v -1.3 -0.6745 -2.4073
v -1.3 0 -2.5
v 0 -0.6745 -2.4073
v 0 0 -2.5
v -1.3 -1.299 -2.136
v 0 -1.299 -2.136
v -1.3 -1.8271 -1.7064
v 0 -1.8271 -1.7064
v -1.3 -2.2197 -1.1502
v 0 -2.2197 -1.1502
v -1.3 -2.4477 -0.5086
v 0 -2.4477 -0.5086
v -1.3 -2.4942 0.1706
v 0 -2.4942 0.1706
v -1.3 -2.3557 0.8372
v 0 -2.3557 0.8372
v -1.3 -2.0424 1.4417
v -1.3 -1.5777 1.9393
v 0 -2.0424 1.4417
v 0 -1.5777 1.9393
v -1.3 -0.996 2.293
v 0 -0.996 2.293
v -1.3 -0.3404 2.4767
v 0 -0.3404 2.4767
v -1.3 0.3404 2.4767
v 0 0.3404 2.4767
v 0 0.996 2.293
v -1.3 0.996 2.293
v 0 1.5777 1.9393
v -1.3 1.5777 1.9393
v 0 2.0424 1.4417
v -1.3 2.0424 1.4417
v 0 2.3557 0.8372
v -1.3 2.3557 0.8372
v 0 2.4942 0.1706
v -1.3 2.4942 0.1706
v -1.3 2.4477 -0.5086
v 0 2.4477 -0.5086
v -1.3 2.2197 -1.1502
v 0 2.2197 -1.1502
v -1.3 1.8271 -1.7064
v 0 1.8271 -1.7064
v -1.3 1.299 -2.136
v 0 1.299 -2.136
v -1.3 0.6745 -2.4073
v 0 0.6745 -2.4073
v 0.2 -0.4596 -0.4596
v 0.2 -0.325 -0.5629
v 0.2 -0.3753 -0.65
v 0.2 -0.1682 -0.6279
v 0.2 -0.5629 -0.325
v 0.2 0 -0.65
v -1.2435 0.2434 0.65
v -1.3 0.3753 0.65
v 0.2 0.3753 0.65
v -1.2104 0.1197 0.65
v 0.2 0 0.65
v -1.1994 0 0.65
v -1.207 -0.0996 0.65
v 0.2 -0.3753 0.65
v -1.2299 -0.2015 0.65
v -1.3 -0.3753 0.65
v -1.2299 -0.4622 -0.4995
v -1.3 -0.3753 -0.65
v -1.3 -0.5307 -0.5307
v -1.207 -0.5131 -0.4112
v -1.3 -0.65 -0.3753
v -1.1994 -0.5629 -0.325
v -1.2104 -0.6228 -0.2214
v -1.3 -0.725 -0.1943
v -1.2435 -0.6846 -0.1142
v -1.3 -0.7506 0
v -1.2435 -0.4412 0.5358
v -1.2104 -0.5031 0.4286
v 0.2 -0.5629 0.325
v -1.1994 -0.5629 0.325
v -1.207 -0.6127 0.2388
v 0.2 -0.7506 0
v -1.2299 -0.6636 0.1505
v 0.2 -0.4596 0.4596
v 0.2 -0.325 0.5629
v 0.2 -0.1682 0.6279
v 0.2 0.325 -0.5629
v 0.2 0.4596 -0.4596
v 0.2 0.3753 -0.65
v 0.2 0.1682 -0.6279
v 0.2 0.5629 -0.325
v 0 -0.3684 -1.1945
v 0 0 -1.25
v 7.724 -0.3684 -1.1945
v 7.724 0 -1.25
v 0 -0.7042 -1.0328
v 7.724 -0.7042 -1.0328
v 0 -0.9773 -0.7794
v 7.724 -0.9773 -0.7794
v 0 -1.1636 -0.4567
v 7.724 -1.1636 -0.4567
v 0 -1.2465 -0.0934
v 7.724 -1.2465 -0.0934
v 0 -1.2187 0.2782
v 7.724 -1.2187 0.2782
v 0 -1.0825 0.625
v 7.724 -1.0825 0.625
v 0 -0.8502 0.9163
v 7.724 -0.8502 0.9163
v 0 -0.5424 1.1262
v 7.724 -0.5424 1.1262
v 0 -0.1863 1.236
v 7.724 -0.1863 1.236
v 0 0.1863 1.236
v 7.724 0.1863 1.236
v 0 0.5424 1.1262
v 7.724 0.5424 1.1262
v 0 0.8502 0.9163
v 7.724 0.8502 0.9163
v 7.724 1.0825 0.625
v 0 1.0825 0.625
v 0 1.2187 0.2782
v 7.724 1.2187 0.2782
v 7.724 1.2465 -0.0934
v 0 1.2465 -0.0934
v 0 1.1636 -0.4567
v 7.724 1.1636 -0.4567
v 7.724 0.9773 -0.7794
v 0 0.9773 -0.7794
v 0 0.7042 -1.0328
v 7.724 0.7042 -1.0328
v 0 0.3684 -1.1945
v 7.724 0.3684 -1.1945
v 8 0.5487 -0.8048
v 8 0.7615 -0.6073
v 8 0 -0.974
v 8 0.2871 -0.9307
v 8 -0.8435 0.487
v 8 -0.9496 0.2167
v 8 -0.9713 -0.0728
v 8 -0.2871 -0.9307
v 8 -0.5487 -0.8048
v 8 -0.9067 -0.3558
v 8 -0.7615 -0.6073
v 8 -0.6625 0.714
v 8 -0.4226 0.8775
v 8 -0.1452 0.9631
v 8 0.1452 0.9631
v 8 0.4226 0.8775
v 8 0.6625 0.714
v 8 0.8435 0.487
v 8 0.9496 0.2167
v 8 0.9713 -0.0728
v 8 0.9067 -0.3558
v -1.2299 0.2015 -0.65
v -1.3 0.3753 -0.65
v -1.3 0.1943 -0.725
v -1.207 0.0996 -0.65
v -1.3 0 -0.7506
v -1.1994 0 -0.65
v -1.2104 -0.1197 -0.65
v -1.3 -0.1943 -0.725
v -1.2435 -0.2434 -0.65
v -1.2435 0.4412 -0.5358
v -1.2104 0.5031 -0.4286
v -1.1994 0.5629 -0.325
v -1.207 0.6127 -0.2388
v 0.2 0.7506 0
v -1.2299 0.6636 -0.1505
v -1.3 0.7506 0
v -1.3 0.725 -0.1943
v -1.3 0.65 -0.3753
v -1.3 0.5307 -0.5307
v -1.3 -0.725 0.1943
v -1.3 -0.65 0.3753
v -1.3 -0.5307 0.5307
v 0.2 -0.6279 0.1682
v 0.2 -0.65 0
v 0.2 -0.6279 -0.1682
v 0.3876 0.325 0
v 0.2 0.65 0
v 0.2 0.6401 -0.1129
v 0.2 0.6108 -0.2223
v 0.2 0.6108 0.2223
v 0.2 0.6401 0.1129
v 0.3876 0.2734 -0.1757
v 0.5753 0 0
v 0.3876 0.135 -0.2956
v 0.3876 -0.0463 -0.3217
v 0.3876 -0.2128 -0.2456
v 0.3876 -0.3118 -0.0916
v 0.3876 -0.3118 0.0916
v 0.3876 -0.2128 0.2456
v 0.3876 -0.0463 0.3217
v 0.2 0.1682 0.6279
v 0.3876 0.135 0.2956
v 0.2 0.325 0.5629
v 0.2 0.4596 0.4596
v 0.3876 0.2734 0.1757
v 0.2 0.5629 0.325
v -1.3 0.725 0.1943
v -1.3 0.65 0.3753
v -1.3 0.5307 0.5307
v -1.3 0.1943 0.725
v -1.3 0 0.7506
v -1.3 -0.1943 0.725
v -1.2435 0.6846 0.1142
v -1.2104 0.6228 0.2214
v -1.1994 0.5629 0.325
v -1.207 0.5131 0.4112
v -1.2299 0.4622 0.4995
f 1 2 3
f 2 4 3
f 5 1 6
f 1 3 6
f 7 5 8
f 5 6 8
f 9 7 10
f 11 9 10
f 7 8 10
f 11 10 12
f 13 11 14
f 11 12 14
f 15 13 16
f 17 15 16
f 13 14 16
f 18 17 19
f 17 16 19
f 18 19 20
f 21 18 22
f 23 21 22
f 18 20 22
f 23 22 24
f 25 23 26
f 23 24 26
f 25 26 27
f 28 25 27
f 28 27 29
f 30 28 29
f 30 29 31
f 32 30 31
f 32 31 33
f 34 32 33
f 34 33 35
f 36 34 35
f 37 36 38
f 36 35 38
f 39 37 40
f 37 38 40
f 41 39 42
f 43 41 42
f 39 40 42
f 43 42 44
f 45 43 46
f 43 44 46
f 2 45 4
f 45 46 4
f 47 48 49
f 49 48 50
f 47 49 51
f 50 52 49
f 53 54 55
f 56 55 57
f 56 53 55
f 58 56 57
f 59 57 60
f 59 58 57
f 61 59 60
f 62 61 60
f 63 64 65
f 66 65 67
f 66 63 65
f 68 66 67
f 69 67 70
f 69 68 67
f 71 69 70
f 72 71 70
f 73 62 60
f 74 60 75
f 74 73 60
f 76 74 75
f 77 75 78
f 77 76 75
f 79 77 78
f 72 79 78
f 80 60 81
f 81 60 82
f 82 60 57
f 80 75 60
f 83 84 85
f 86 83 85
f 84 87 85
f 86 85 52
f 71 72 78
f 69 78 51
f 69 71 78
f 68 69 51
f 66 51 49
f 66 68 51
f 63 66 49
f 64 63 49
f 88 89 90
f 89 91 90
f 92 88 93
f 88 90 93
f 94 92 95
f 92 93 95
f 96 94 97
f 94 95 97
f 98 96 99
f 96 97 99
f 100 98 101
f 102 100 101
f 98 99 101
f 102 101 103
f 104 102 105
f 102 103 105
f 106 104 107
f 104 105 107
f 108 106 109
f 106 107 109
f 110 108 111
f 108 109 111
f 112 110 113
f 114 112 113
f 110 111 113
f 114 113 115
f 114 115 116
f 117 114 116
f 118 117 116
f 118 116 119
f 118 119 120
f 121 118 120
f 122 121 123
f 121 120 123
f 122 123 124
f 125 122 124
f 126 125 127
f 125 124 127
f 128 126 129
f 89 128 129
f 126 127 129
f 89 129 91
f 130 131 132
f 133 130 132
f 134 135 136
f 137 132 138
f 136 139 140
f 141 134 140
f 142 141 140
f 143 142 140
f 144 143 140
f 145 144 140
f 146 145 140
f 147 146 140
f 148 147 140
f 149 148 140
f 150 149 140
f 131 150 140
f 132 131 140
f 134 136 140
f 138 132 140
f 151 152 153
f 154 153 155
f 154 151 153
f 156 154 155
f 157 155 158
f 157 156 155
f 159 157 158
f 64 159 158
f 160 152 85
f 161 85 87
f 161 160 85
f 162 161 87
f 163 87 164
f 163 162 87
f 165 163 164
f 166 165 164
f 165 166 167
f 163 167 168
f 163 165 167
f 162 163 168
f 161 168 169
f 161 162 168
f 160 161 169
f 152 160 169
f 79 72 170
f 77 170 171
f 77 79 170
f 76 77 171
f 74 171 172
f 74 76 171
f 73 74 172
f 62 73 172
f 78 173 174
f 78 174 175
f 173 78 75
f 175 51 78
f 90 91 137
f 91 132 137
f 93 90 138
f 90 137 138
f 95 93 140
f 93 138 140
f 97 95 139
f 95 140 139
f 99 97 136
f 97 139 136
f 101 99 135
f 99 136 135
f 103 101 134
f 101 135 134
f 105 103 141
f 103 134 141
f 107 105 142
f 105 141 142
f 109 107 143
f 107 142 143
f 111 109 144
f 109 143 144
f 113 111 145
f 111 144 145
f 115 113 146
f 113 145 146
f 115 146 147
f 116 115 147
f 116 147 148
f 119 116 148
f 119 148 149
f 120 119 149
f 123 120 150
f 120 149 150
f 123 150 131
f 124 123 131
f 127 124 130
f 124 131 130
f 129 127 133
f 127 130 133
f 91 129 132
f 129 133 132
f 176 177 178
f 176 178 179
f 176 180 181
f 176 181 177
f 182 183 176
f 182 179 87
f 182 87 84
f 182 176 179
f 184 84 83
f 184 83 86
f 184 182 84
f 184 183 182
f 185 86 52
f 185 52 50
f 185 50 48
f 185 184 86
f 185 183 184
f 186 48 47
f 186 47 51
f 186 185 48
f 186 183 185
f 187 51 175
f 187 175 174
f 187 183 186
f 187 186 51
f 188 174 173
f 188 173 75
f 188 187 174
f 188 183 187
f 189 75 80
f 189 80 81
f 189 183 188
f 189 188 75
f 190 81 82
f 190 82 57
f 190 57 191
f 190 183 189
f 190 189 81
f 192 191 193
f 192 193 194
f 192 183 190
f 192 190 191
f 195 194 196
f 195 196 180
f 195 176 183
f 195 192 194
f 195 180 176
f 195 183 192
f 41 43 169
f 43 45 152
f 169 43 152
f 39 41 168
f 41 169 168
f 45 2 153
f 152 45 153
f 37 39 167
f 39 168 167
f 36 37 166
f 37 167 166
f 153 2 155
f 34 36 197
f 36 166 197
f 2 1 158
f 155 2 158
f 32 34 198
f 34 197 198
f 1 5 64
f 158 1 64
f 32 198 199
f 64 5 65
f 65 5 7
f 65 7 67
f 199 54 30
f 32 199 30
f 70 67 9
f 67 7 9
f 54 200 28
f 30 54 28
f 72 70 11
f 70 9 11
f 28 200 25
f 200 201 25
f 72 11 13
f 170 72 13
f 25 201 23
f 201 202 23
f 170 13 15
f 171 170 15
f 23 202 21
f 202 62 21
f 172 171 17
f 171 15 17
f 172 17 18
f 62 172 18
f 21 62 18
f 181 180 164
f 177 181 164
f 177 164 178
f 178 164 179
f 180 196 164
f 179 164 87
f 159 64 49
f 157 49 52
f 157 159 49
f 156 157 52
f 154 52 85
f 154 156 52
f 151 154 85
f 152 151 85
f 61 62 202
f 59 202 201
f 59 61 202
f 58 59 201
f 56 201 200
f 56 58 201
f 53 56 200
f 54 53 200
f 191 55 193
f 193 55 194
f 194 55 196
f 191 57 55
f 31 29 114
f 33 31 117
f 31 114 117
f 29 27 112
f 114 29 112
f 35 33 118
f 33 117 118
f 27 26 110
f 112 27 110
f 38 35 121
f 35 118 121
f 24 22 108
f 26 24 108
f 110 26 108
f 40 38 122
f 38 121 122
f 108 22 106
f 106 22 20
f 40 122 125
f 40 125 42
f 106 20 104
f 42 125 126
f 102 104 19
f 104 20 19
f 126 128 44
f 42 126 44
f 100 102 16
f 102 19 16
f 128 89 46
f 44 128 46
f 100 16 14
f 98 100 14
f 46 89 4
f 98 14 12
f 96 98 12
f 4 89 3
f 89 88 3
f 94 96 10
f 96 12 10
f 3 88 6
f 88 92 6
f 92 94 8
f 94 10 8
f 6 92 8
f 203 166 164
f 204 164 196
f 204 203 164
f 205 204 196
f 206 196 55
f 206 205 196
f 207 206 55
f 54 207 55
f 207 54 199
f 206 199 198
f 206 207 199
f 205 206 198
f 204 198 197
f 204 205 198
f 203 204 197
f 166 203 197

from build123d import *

# Parameters (mm, degrees)
ENL_V_MAT_EXTRU_1_DEPTH = 1.5


with BuildPart() as part:
    # Esquisse1 → Révolution1 (revolve)
    with BuildSketch(Plane(origin=(0, 0, 0), x_dir=(1, 0, 0), z_dir=(0, 1, 0))):
        Polygon((-1.3, 0), (-1.3, 2.5), (0, 2.5), (0, 1.25), (7.724, 1.25), (8, 0.974), (8, 0), align=None)
    revolve(axis=Axis((8, 0, 0), (-1, 0, 0)))

    # Esquisse2 → Enlèvement de matière-Révolution1 (revolve, cut)
    with BuildSketch(Plane.XY):
        Polygon((-1.3, 0), (-1.3, 0.75055535), (-1.19944465, 0.65), (0.2, 0.65), (0.575277675, 0), align=None)
    revolve(axis=Axis((0.575277675, 0, 0), (-1, 0, 0)), mode=Mode.SUBTRACT)

    # Esquisse3 → Enlèv. mat.-Extru.1 (cut)
    with BuildSketch(Plane(origin=(-1.3, 0, 0), x_dir=(0, 0, -1), z_dir=(1, 0, 0))):
        Polygon((-0.65, 0.375277675), (-0.65, -0.375277675), (0, -0.75055535), (0.65, -0.375277675), (0.65, 0.375277675), (0, 0.75055535), align=None)
    extrude(amount=ENL_V_MAT_EXTRU_1_DEPTH, mode=Mode.SUBTRACT)


solid = part.part
